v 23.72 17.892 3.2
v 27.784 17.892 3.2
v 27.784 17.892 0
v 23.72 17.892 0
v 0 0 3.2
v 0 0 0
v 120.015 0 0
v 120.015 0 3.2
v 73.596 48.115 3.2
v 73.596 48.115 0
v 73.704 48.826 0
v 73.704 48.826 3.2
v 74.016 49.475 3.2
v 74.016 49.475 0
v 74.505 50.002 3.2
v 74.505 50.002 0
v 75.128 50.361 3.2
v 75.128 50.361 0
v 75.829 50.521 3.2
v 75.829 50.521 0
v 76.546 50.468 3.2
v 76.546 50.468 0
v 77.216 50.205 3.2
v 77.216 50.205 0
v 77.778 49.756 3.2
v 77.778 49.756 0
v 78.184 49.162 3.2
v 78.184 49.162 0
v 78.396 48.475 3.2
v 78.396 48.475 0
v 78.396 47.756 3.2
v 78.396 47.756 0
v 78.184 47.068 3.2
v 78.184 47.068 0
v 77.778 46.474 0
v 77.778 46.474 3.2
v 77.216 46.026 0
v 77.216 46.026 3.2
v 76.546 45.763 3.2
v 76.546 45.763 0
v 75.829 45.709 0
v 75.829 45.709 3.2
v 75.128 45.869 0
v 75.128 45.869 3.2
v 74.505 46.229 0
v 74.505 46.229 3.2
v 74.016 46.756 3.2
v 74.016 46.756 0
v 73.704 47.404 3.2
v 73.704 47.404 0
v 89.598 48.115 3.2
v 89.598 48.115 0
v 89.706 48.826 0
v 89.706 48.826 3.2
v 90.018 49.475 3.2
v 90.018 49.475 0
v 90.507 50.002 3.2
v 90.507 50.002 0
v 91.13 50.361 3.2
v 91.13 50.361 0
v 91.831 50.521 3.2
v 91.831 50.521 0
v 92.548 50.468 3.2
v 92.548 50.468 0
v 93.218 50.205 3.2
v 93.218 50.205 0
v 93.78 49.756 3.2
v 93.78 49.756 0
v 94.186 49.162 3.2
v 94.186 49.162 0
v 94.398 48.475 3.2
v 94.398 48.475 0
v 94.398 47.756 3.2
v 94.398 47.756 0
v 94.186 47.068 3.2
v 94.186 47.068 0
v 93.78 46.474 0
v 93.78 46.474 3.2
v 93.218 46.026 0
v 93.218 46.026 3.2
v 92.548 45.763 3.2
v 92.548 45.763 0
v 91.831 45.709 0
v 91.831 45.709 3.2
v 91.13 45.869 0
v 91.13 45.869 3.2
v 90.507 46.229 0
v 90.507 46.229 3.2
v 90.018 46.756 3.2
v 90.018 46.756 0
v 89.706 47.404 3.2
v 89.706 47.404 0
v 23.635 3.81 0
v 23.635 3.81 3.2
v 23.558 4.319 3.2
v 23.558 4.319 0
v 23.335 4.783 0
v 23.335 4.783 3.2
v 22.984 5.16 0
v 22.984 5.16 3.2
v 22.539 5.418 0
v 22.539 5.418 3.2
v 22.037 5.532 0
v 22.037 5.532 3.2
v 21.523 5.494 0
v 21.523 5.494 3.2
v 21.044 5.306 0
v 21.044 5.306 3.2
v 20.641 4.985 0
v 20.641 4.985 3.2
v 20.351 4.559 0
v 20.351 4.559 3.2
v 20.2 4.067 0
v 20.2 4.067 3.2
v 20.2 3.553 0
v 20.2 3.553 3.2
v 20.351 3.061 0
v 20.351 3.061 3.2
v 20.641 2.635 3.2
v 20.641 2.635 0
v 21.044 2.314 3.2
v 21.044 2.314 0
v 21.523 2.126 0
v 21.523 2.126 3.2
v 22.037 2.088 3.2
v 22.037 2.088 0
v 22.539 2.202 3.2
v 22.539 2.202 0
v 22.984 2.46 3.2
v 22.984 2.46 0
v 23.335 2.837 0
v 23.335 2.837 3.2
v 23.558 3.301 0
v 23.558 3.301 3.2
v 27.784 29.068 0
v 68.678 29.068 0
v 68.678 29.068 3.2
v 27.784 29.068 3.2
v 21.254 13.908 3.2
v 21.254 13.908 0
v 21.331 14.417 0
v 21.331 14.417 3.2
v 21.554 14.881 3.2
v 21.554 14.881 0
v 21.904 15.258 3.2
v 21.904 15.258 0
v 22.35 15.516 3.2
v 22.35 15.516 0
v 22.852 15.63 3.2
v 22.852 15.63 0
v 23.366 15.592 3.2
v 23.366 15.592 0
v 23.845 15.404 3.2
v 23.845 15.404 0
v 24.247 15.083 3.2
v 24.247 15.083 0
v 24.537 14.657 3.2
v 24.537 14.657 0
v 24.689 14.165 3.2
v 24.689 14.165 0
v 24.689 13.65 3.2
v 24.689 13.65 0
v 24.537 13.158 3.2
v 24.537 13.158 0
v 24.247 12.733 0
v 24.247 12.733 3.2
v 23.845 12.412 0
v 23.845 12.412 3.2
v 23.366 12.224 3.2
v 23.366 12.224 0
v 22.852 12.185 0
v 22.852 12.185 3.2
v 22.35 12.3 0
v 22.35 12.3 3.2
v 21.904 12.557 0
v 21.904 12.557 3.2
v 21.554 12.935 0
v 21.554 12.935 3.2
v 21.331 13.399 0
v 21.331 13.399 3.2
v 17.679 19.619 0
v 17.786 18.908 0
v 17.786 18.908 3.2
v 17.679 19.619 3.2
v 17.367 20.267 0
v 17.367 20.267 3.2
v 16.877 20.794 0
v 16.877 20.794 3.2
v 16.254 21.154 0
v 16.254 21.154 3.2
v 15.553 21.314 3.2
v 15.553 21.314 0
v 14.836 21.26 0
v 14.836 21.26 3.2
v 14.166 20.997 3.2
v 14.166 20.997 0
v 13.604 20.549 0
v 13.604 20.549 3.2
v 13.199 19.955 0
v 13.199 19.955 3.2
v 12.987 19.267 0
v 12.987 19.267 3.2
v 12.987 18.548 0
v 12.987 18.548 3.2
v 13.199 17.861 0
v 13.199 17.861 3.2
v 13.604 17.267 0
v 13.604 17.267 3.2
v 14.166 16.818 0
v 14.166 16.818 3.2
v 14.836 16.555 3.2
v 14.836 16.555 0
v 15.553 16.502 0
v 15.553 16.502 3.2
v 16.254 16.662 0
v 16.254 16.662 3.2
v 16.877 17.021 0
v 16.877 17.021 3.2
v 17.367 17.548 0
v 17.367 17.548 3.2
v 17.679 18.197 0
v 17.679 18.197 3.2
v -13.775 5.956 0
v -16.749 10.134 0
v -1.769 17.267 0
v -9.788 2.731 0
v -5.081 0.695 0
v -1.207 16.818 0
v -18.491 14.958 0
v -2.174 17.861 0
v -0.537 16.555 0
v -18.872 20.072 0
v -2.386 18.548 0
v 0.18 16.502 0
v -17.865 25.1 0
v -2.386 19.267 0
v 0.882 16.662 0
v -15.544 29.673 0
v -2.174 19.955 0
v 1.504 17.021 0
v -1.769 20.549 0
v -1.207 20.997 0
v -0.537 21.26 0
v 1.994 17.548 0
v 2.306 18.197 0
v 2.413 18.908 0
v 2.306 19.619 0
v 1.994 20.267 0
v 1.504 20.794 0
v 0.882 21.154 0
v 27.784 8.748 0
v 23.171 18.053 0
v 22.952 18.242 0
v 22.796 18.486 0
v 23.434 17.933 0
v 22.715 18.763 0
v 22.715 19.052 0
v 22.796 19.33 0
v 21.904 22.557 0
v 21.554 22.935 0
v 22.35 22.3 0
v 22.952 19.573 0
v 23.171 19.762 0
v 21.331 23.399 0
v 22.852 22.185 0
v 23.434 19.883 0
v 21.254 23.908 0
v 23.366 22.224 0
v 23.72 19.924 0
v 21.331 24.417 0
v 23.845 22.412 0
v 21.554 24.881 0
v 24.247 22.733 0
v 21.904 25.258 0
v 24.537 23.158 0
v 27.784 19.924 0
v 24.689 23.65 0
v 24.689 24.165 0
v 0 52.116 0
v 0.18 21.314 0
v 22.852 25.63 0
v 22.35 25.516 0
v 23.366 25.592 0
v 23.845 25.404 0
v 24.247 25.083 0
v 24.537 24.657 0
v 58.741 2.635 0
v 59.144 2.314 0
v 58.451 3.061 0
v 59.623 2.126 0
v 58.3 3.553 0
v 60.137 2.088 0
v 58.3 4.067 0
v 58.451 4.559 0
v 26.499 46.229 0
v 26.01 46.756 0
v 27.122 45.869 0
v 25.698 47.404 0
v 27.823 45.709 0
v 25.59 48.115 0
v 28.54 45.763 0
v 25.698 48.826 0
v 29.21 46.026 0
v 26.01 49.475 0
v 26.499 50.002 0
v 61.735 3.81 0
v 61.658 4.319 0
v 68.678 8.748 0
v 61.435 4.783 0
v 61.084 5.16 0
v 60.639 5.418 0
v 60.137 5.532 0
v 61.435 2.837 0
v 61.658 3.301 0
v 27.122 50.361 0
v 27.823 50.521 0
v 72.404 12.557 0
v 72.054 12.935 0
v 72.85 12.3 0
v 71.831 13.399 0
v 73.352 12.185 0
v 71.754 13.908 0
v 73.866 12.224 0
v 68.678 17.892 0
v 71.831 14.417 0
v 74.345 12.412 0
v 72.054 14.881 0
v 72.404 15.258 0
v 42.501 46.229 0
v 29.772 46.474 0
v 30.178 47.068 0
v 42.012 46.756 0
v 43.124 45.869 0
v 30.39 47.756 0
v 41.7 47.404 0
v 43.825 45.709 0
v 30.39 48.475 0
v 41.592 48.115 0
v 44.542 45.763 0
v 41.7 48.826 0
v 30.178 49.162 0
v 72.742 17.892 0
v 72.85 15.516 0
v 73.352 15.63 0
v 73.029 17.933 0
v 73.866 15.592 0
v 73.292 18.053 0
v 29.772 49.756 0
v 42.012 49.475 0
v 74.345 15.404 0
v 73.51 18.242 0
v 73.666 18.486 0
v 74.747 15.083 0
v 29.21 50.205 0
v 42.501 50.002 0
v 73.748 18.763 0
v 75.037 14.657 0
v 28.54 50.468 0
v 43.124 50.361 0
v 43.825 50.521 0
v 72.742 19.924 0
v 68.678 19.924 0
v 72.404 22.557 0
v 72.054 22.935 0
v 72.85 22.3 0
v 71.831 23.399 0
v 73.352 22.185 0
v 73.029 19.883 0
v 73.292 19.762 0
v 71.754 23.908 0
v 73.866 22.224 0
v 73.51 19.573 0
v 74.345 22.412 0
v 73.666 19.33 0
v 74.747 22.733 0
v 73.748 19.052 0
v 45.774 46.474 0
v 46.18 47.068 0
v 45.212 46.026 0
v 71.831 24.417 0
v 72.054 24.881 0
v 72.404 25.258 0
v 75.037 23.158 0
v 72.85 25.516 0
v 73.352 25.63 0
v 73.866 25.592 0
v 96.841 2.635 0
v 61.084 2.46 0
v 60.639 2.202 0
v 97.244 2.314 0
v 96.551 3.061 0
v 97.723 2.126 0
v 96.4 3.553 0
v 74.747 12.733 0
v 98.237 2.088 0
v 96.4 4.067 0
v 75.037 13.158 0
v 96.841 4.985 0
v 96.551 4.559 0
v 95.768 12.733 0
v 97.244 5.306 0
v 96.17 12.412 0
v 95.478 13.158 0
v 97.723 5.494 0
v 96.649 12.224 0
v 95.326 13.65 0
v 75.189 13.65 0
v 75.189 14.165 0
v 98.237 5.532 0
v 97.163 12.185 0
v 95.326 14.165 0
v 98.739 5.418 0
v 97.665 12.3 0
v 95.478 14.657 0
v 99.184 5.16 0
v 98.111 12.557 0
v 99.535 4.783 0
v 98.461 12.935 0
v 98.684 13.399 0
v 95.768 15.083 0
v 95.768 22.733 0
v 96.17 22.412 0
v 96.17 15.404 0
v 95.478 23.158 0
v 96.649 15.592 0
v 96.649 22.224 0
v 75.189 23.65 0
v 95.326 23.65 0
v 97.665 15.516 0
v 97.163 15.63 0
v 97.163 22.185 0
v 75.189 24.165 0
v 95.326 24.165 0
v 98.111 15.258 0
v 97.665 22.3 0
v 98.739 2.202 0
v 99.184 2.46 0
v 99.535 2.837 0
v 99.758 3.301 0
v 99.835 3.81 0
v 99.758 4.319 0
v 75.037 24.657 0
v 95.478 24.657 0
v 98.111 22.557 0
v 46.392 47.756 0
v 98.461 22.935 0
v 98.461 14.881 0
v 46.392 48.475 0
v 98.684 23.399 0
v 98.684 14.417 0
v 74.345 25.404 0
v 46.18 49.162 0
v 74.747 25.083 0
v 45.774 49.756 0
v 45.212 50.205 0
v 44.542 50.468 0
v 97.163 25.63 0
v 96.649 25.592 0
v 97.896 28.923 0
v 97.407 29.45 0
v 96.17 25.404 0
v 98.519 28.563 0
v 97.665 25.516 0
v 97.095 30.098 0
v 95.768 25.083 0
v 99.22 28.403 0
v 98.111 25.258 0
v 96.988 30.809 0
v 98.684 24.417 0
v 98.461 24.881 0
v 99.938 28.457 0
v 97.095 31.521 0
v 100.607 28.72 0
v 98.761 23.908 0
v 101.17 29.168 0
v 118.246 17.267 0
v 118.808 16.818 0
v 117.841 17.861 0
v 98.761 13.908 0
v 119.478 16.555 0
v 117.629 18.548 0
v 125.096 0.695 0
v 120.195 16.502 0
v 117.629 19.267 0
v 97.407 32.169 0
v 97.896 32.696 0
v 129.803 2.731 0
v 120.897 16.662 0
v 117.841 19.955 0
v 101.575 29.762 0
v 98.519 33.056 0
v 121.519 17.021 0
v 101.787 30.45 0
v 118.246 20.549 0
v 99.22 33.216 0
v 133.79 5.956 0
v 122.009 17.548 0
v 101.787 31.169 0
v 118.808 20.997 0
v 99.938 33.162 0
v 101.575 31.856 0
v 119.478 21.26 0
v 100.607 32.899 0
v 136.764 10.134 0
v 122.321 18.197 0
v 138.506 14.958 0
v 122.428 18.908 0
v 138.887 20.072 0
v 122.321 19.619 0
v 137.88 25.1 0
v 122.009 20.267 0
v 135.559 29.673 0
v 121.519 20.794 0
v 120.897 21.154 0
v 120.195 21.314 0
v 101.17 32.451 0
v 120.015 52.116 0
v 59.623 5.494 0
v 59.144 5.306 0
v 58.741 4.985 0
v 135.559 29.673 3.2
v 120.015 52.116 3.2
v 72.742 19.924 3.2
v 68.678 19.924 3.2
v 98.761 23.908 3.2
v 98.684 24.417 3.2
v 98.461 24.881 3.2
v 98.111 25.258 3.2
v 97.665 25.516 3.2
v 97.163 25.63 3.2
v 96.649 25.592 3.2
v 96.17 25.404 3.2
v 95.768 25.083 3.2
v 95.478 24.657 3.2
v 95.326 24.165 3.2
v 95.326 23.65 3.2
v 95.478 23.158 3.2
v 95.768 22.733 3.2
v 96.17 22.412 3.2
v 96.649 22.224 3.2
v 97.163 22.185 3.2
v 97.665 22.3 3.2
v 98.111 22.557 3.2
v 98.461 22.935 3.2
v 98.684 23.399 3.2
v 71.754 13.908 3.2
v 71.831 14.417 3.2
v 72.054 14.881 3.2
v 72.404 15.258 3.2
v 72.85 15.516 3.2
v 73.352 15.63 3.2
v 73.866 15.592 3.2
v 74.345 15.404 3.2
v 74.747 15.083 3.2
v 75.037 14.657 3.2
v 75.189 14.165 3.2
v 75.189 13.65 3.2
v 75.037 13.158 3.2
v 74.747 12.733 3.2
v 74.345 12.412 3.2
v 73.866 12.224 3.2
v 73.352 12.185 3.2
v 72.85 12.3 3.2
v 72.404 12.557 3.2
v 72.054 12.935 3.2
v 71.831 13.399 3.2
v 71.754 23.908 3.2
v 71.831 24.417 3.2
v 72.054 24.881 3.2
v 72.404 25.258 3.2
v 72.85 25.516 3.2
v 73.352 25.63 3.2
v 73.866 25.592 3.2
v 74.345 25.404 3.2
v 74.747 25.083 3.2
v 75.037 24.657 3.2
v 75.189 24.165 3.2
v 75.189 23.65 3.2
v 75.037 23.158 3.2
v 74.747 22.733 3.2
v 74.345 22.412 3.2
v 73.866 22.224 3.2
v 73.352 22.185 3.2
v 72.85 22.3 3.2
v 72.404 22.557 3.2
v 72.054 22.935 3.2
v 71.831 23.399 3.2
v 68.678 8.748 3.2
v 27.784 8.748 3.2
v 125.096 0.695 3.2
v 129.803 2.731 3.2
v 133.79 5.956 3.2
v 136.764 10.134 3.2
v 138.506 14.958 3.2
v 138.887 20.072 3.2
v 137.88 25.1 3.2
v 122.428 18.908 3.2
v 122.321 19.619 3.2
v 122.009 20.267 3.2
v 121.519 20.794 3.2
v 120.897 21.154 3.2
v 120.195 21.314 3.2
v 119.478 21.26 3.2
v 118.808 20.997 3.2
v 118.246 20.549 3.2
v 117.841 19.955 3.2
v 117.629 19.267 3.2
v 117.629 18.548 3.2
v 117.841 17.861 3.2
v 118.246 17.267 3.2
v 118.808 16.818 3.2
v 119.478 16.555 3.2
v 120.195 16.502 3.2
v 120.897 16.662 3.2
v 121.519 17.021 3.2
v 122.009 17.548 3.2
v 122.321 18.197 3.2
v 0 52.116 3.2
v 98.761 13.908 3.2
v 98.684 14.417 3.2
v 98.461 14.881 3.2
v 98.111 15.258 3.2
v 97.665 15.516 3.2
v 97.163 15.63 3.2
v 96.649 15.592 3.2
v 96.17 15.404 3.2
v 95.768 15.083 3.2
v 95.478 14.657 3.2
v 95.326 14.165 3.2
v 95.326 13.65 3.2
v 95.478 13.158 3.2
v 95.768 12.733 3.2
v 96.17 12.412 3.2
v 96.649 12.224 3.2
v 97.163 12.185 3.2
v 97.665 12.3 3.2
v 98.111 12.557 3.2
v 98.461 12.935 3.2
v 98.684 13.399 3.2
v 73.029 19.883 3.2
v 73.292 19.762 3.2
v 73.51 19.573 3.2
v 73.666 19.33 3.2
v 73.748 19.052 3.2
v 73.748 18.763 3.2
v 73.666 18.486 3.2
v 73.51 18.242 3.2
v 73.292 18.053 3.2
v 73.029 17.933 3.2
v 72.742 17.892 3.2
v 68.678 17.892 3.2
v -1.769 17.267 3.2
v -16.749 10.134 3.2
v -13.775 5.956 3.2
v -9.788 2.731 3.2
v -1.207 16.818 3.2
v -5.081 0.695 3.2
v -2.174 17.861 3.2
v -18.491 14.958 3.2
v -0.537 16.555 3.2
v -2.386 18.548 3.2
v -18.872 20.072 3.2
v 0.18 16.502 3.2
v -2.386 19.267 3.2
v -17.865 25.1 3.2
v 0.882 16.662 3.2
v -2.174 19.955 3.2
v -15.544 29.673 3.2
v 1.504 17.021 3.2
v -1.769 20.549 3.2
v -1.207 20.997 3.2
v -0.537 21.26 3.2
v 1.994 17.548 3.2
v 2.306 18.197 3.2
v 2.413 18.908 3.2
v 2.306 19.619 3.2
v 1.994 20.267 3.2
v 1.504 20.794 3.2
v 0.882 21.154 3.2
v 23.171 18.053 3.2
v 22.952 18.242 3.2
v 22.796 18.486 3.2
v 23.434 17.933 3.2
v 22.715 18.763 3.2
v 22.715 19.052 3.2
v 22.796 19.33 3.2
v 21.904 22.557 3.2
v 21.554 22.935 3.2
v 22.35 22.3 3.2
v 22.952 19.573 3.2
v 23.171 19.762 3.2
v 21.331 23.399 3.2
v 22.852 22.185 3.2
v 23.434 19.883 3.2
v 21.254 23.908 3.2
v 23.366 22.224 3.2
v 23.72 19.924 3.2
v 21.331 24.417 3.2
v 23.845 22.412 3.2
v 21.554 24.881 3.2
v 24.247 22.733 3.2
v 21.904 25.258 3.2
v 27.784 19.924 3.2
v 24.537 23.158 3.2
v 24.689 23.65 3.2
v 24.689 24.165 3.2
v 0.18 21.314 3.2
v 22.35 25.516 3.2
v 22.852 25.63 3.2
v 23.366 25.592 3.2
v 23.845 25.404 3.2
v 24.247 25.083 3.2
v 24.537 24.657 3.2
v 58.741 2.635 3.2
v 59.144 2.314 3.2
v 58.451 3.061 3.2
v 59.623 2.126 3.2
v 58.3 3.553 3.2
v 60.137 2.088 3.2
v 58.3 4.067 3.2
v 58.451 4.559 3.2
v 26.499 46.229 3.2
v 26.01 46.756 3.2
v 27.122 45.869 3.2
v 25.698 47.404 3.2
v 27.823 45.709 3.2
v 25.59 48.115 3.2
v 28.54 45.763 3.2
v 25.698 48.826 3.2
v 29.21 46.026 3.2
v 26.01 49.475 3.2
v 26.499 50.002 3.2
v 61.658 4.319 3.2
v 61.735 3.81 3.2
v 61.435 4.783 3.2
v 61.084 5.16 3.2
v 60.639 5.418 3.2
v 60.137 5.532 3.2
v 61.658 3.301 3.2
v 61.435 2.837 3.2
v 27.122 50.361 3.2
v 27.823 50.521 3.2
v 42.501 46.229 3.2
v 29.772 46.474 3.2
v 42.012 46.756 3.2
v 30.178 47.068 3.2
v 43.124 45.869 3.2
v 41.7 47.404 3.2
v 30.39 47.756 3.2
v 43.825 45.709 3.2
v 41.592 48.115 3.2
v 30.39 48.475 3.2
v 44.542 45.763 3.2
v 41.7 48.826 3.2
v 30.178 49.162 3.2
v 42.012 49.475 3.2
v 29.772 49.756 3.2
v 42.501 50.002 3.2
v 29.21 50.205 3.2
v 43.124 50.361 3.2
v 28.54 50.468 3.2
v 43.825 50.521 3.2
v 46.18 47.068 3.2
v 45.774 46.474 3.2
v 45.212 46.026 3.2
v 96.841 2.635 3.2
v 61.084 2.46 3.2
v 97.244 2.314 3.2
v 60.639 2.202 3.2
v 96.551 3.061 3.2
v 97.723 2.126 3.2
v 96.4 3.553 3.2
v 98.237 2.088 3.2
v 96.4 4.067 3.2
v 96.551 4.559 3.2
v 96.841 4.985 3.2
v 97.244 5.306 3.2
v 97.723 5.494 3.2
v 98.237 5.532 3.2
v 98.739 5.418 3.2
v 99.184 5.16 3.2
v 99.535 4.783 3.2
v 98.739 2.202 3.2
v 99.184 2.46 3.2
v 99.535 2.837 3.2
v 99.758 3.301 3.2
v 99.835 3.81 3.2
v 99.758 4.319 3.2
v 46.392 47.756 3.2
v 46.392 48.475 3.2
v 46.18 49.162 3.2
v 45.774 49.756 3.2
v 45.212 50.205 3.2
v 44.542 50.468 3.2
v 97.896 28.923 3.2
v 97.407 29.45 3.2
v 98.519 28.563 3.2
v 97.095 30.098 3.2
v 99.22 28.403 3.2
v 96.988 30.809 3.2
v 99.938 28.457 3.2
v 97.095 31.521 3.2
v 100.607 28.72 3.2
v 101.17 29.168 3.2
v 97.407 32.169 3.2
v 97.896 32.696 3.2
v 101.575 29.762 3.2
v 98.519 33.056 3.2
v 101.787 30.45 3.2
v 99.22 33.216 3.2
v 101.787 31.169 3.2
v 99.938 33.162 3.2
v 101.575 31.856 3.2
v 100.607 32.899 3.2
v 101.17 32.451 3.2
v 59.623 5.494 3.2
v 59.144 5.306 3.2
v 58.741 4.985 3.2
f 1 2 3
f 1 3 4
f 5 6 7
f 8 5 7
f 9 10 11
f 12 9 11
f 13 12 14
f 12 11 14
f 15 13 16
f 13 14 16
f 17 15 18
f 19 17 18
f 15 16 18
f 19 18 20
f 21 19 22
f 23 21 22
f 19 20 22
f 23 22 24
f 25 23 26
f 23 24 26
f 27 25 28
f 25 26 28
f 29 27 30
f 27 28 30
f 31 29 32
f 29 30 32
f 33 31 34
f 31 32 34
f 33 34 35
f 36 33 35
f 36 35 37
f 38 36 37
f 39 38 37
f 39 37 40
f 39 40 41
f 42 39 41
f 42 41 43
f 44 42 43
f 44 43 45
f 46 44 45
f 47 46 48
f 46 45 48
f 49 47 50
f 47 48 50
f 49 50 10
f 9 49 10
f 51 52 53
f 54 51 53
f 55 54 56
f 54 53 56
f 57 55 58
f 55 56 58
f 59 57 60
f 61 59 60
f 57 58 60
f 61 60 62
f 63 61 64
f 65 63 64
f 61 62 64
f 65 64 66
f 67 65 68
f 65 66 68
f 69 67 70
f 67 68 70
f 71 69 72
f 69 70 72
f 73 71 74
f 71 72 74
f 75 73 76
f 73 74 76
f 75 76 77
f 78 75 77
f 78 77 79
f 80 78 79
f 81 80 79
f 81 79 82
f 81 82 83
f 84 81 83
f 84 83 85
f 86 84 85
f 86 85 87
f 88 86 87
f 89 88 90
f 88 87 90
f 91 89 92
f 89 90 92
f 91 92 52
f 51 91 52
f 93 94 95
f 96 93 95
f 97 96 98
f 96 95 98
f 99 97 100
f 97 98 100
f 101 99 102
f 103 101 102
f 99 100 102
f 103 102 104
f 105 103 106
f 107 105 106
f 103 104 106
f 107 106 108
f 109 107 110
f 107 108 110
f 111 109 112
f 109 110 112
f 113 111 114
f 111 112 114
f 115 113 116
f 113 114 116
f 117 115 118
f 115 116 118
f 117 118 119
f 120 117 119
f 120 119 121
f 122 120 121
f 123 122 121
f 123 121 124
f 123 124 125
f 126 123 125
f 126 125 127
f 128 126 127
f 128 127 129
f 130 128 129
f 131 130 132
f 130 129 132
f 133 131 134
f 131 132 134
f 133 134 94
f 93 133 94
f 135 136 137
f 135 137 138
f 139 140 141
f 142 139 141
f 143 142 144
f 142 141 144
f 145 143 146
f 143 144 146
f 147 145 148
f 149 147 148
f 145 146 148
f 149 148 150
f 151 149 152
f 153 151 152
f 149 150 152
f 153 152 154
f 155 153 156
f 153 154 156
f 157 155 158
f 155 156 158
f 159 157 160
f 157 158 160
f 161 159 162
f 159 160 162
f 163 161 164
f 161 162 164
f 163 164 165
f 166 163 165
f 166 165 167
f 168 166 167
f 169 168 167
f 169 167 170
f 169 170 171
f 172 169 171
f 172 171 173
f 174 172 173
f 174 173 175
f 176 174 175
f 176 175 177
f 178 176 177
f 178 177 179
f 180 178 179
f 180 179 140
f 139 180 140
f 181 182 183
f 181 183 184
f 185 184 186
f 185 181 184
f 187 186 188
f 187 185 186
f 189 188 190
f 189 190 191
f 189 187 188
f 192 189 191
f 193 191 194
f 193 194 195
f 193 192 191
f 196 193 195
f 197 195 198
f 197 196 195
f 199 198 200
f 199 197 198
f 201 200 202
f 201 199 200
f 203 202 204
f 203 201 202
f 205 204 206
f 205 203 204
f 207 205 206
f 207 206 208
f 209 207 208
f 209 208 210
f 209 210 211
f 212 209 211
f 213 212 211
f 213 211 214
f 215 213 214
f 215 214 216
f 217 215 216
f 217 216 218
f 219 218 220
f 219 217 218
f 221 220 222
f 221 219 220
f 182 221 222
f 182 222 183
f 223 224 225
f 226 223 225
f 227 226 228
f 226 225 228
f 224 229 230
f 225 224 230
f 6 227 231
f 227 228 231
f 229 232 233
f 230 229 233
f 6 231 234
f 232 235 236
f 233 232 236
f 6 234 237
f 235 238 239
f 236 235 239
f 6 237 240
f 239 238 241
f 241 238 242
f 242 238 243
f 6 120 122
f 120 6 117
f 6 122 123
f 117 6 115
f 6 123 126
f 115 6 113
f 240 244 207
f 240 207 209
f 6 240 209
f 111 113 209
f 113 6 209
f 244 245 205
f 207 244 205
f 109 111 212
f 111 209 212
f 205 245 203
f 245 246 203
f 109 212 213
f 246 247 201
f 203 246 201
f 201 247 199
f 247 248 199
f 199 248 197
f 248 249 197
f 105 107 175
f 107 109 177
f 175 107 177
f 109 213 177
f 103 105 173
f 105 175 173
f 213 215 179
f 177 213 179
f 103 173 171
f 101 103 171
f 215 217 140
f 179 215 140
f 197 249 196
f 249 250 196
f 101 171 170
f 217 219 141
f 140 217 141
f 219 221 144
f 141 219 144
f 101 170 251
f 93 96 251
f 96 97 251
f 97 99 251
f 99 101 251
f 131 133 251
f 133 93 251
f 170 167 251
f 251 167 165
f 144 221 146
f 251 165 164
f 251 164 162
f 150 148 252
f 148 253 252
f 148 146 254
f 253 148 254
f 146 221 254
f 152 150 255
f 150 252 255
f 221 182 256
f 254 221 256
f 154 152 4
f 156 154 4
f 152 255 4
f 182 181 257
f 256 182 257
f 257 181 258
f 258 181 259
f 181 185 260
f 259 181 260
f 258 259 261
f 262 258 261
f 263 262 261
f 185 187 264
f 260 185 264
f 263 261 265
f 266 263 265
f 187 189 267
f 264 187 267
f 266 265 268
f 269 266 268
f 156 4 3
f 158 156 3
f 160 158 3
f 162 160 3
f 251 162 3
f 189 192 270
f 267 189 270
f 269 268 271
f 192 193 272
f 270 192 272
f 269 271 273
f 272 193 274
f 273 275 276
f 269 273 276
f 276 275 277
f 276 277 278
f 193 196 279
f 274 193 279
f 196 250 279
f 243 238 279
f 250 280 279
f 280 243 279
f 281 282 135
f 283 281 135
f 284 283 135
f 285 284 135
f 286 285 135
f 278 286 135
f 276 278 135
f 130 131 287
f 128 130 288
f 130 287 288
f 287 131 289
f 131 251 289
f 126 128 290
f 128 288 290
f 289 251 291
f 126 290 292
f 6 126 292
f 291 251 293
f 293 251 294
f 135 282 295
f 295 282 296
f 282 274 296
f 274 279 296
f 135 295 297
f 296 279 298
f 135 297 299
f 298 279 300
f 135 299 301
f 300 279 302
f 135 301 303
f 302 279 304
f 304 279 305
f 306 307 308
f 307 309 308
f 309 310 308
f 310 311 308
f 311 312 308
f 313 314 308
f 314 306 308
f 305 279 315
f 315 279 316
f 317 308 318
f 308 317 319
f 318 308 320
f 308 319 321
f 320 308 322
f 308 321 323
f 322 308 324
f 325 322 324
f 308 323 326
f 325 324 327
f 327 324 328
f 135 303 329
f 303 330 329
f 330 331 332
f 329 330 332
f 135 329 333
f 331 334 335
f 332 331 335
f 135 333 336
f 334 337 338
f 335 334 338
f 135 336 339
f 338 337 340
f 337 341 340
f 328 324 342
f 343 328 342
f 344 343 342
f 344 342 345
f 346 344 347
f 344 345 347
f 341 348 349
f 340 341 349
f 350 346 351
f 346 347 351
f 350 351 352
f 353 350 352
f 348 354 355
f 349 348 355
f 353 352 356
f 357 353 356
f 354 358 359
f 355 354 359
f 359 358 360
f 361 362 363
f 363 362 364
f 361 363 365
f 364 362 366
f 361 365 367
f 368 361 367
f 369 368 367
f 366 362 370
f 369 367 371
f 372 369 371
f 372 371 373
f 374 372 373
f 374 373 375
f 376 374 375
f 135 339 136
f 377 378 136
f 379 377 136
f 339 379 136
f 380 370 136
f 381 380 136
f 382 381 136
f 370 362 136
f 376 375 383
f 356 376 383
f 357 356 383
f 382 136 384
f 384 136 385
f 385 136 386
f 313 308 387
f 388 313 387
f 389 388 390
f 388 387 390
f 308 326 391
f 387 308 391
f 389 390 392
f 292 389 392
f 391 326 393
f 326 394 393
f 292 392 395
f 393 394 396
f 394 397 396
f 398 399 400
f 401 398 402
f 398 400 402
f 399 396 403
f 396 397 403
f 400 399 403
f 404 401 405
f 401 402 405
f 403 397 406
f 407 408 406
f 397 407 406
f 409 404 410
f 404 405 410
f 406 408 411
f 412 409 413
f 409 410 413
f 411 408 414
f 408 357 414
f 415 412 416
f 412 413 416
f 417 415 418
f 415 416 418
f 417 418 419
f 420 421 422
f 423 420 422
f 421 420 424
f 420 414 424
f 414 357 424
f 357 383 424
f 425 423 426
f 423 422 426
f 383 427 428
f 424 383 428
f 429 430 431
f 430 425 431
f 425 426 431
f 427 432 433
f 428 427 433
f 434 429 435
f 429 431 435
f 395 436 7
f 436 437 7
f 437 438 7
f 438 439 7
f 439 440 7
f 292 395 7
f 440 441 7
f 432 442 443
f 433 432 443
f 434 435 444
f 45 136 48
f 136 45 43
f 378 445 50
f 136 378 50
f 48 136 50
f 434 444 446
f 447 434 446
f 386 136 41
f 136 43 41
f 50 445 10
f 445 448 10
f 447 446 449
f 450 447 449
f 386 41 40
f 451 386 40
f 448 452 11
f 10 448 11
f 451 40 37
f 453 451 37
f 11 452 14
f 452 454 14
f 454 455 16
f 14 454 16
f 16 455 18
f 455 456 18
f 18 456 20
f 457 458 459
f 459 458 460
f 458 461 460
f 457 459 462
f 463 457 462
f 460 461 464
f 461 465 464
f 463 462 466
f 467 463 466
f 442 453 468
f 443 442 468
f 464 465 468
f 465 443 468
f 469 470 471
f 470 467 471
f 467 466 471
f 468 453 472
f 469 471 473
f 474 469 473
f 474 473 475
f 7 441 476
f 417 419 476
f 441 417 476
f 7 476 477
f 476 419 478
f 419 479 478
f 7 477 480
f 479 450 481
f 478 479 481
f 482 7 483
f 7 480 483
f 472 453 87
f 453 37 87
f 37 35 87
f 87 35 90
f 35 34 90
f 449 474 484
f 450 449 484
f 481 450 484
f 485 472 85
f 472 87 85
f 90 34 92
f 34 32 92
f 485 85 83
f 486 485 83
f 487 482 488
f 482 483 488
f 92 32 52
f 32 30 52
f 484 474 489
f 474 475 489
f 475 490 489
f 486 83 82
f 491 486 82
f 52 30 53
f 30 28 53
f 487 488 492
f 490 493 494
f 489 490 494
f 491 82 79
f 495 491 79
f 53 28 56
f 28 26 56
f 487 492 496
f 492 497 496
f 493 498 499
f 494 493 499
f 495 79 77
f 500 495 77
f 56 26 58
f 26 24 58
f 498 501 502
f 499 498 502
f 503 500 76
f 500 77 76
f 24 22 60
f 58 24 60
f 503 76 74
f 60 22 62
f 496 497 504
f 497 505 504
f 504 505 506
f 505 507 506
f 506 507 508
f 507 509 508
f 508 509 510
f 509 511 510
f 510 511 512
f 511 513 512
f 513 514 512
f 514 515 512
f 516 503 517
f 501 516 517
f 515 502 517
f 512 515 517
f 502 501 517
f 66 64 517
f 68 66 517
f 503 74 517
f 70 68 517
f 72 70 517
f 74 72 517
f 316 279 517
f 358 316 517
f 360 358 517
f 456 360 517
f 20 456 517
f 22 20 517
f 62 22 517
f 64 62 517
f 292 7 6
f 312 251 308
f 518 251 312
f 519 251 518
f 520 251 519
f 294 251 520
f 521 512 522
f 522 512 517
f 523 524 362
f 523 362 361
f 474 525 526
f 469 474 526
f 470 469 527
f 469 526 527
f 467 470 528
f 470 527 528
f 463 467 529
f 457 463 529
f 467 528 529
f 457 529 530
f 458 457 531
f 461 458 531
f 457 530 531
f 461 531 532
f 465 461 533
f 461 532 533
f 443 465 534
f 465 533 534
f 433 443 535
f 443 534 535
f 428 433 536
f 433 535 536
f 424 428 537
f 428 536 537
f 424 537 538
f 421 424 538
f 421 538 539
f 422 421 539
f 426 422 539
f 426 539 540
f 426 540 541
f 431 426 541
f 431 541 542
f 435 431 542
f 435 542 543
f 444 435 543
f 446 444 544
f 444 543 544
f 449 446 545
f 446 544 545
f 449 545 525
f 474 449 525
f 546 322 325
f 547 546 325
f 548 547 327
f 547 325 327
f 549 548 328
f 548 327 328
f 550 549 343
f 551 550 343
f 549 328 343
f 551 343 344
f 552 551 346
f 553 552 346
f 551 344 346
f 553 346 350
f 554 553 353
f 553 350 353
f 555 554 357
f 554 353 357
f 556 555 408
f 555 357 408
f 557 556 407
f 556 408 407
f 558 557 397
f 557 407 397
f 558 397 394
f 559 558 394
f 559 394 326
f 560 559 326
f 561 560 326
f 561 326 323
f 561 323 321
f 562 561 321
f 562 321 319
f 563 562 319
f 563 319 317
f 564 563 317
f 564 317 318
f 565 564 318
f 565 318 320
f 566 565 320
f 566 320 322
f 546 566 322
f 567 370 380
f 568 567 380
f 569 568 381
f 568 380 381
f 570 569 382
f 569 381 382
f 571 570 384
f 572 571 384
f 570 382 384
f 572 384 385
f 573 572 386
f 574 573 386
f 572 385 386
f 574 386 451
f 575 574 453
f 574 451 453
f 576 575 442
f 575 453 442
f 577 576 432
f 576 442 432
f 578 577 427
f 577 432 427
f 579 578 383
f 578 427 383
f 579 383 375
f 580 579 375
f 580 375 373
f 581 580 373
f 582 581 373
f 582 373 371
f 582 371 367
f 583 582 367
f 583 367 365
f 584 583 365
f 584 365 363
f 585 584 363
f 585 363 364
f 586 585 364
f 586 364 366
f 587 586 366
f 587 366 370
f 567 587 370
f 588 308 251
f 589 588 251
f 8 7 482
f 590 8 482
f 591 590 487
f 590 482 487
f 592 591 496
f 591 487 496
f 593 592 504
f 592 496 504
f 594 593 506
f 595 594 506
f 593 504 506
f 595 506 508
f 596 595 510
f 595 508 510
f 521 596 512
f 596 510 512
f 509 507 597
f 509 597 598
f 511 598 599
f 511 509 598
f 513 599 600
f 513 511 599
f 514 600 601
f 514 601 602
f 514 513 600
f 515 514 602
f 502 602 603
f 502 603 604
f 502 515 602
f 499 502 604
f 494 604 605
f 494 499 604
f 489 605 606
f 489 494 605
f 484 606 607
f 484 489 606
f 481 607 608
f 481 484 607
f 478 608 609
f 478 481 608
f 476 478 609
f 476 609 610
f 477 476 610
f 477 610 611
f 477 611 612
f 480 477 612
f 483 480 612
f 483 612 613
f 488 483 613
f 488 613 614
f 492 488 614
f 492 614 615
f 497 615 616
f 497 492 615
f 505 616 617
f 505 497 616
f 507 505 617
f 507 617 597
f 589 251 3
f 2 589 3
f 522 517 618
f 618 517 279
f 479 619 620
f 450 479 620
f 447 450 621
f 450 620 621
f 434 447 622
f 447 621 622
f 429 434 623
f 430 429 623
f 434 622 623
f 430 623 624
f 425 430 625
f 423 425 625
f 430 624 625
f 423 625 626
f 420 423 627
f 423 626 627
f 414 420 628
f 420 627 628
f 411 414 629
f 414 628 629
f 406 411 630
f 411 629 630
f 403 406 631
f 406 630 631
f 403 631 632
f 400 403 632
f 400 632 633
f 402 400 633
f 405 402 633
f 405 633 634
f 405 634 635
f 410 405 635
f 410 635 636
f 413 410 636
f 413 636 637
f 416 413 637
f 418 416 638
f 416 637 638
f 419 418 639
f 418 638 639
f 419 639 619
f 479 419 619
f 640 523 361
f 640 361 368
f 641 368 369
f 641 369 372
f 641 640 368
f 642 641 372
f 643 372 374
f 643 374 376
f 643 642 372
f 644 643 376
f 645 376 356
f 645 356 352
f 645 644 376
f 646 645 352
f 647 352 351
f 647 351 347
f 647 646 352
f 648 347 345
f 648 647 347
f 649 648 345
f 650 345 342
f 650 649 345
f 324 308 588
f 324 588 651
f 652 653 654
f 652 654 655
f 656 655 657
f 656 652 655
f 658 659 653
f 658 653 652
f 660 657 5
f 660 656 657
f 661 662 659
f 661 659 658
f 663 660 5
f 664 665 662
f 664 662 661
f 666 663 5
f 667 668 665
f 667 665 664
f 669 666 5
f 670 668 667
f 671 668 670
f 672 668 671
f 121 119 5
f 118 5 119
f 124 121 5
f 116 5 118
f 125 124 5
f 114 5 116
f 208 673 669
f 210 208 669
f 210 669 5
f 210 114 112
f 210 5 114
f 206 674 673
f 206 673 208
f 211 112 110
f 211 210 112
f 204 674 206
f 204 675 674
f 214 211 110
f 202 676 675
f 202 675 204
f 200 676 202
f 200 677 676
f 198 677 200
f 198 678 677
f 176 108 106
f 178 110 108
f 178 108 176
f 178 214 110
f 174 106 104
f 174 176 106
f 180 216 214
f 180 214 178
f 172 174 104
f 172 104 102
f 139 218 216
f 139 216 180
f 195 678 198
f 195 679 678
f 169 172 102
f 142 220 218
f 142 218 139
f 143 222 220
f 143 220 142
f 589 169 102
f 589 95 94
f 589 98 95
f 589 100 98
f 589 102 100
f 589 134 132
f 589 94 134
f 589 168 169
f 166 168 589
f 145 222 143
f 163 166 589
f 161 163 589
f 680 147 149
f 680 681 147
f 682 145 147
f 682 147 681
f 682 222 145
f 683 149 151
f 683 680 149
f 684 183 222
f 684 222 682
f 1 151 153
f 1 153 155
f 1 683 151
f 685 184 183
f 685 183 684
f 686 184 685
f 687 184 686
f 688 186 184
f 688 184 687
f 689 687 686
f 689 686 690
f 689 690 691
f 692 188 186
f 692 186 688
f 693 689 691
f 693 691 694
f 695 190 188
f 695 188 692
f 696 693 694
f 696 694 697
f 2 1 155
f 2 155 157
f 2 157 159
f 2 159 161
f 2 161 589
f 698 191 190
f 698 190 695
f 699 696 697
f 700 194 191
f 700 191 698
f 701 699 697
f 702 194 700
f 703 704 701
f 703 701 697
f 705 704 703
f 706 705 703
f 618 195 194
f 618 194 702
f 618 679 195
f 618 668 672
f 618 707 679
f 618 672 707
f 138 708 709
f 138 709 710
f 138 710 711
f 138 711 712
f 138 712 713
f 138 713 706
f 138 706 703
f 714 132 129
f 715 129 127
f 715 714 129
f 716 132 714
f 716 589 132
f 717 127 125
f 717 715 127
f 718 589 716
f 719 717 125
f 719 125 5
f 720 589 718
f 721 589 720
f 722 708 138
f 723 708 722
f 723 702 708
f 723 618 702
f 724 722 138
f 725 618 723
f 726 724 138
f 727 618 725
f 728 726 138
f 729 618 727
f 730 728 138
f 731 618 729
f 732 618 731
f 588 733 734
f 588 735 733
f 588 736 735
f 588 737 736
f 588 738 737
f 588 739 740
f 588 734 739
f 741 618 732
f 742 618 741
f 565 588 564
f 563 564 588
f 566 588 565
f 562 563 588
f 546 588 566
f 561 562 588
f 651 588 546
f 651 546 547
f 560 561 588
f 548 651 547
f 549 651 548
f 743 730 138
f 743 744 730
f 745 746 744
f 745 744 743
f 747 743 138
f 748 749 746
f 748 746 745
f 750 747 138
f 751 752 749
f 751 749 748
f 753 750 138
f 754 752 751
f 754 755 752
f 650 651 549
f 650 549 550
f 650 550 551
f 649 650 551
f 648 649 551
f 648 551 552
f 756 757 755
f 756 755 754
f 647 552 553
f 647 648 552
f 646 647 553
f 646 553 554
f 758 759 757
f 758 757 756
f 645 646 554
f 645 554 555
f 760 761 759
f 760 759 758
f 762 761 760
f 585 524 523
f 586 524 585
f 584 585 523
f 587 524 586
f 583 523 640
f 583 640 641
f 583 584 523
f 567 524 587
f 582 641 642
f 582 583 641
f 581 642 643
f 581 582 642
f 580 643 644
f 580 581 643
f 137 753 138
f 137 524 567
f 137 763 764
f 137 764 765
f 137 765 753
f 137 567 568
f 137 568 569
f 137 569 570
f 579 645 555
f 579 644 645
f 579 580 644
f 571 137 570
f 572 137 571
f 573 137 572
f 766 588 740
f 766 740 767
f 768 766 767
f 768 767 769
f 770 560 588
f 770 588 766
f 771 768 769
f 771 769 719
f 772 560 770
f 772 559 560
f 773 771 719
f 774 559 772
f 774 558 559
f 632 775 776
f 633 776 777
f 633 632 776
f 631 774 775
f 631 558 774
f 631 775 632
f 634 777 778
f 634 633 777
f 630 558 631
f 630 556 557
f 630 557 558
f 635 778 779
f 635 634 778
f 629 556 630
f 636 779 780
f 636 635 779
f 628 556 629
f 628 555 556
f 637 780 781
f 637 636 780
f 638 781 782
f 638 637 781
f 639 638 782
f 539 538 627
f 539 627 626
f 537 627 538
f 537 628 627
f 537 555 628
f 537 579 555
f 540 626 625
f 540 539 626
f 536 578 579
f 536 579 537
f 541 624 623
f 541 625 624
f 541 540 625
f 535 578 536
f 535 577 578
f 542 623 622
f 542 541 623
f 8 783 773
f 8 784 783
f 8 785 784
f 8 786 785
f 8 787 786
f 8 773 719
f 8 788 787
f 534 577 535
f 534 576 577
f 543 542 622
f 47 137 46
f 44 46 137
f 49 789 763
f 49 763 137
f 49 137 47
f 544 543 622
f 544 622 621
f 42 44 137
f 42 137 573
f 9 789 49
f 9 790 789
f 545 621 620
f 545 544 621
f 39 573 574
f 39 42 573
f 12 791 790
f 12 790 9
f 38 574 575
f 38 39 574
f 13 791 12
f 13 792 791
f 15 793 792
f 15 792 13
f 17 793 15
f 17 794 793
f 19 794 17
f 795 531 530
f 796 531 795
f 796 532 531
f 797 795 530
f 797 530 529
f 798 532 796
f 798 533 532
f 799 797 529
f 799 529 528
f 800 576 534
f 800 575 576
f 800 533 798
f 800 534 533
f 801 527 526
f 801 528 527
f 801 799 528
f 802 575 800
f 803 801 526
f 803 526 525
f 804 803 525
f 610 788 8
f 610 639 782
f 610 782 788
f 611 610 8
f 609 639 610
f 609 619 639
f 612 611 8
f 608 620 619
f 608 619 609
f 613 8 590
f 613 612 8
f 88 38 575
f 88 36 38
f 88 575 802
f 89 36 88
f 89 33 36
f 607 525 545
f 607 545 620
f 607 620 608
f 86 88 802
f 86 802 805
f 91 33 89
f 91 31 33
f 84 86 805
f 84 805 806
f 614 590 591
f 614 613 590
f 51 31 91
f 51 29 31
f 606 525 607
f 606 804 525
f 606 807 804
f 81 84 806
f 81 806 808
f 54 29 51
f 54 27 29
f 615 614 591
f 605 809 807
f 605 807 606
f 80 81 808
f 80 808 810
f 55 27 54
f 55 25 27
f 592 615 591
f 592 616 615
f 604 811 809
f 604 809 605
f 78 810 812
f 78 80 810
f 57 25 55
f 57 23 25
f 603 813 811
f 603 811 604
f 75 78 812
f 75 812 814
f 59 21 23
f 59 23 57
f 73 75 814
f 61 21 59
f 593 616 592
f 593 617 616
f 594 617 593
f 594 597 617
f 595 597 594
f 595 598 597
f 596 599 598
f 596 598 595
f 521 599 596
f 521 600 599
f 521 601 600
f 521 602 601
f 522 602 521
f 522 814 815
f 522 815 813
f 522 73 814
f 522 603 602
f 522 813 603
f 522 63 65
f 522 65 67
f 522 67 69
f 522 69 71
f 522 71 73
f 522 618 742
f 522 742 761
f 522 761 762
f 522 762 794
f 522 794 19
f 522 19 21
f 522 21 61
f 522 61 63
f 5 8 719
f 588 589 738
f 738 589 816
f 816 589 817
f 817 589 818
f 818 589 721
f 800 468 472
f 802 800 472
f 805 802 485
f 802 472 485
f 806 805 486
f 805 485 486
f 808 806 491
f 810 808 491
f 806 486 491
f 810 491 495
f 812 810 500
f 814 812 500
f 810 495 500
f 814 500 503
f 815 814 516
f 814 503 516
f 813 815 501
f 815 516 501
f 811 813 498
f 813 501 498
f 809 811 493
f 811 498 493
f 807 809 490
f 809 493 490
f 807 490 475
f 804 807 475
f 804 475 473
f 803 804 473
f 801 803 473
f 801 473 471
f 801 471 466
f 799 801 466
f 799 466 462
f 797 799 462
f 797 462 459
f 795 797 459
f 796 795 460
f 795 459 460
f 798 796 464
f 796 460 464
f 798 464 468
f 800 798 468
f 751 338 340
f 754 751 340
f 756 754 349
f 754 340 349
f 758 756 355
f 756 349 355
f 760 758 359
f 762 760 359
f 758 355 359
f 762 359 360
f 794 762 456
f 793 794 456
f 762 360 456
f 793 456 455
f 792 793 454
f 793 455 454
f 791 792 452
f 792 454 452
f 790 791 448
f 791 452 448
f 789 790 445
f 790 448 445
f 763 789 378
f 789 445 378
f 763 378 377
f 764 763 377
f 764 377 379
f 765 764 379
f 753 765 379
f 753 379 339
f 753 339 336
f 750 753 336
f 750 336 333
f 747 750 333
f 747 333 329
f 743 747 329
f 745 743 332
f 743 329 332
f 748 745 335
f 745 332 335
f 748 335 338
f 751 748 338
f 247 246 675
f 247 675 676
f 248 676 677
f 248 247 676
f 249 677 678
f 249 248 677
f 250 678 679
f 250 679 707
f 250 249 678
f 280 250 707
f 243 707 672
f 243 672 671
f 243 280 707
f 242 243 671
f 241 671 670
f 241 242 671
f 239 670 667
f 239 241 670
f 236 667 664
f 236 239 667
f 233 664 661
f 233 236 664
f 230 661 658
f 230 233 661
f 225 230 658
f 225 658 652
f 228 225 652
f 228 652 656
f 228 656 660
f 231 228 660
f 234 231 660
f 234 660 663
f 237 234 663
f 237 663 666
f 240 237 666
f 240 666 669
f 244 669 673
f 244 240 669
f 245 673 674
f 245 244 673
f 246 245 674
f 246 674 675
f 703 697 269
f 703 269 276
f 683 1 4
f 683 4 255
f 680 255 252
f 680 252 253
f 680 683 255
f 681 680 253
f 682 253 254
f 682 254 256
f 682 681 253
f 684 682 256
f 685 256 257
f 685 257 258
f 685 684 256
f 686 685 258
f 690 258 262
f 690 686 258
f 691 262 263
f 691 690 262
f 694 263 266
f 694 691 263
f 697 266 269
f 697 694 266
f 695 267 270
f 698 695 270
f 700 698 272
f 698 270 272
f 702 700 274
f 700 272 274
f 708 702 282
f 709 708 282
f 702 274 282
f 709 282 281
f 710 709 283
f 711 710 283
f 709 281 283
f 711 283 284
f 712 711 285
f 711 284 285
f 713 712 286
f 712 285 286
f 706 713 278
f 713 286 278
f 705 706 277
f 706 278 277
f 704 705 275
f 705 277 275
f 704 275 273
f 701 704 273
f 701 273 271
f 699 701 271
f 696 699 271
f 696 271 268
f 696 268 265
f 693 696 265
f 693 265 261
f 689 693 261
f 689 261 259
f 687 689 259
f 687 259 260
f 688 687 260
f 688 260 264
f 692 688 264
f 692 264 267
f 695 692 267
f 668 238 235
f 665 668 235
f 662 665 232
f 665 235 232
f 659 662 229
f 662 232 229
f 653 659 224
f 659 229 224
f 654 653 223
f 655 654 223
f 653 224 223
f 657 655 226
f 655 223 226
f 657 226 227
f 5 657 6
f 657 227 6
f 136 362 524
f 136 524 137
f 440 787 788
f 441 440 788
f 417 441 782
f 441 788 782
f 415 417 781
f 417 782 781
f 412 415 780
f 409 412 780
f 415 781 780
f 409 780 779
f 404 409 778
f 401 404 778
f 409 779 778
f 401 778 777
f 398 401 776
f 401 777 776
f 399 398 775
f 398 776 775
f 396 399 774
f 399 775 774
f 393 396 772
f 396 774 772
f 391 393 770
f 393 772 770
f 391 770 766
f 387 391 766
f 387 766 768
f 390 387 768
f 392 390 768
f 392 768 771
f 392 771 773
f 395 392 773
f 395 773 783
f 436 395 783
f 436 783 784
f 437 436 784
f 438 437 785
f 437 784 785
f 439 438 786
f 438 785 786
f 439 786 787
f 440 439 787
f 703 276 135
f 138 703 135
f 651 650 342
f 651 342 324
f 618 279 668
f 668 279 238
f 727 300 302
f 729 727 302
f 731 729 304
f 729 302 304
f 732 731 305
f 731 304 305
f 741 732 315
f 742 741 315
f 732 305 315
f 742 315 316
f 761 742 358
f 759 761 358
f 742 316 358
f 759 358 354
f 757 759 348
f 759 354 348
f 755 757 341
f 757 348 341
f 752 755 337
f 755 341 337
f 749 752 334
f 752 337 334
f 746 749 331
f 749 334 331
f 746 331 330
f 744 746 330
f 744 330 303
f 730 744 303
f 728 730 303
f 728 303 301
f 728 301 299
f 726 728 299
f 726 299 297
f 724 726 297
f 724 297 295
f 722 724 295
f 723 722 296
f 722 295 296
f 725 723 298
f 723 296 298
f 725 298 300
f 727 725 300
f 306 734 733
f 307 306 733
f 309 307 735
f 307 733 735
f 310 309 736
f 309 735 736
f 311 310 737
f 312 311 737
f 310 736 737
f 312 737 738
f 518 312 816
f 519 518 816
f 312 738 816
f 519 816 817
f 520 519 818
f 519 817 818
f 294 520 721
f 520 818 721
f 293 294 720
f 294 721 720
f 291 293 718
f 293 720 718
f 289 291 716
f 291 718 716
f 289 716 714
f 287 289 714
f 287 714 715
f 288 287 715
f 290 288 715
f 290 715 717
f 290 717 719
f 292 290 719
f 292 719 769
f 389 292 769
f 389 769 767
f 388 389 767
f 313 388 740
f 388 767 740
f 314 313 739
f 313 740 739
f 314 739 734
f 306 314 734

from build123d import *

# Parameters (mm, degrees)
SKETCH1_R           = 2.413
BOSS_EXTRUDE1_DEPTH = 3.2004
SKETCH2_R           = 2.413
CUT_EXTRUDE1_DEPTH  = 3.2004
SKETCH5_R           = 1.7272
SKETCH5_W           = 40.894
SKETCH5_H           = 20.32
CUT_EXTRUDE3_DEPTH  = 149.410997158
SKETCH6_R           = 1.7272
CUT_EXTRUDE4_DEPTH  = 3.2004
SKETCH7_R           = 2.413
CUT_EXTRUDE5_DEPTH  = 3.2004
SKETCH8_R           = 1.7272
CUT_EXTRUDE6_DEPTH  = 3.2004


with BuildPart() as part:
    # Sketch1 → Boss-Extrude1 (new body)
    with BuildSketch(Plane.XY):
        with BuildLine():
            Line((120.015, 52.11572), (0, 52.11572))
            Line((0, 52.11572), (-15.54366081, 29.673353196))
            ThreePointArc((-15.54366081, 29.673353196), (-16.74897968, 10.134216365), (0, 0))
            Line((0, 0), (120.015, 0))
            ThreePointArc((120.015, 0), (136.76397968, 10.134216365), (135.55866081, 29.673353196))
            Line((135.55866081, 29.673353196), (120.015, 52.11572))
        make_face()
        with Locations((120.015, 18.90776)):
            Circle(SKETCH1_R, mode=Mode.SUBTRACT)
        with Locations((0, 18.90776)):
            Circle(SKETCH1_R, mode=Mode.SUBTRACT)
        with Locations((15.37290121, 18.90776)):
            Circle(SKETCH1_R, mode=Mode.SUBTRACT)
    extrude(amount=BOSS_EXTRUDE1_DEPTH)

    # Sketch2 → Cut-Extrude1 (cut)
    with BuildSketch(Plane(origin=(0, 0, 0), x_dir=(-1, 0, 0), z_dir=(0, 0, -1))):
        with Locations((-92.0115, 48.11522)):
            Circle(SKETCH2_R)
        with Locations((-76.0095, 48.11522)):
            Circle(SKETCH2_R)
        with Locations((-44.0055, 48.11522)):
            Circle(SKETCH2_R)
        with Locations((-28.0035, 48.11522)):
            Circle(SKETCH2_R)
    extrude(amount=-CUT_EXTRUDE1_DEPTH, mode=Mode.SUBTRACT)

    # Sketch5 → Cut-Extrude3 (cut, through all)
    with BuildSketch(Plane(origin=(0, 0, 0), x_dir=(-1, 0, 0), z_dir=(0, 0, -1))):
        with Locations((-73.48130308, 23.90776)):
            Circle(SKETCH5_R)
        with Locations((-22.98130308, 13.90776)):
            Circle(SKETCH5_R)
        with Locations((-22.98130308, 23.90776)):
            Circle(SKETCH5_R)
        with Locations((-73.48130308, 13.90776)):
            Circle(SKETCH5_R)
        with Locations((-48.23130308, 18.90776)):
            Rectangle(SKETCH5_W, SKETCH5_H)
    extrude(amount=-CUT_EXTRUDE3_DEPTH, mode=Mode.SUBTRACT)

    # Sketch6 → Cut-Extrude4 (cut)
    with BuildSketch(Plane.XY.offset(3.2004)):
        with Locations((97.03369692, 23.90776)):
            Circle(SKETCH6_R)
        with Locations((97.03369692, 13.90776)):
            Circle(SKETCH6_R)
        with BuildLine():
            Line((23.72030308, 19.92376), (27.78430308, 19.92376))
            Line((27.78430308, 19.92376), (27.78430308, 17.89176))
            Line((27.78430308, 17.89176), (23.72030308, 17.89176))
            ThreePointArc((23.72030308, 17.89176), (22.70430308, 18.90776), (23.72030308, 19.92376))
        make_face()
        with BuildLine():
            Line((68.67830308, 19.92376), (72.74230308, 19.92376))
            ThreePointArc((72.74230308, 19.92376), (73.75830308, 18.90776), (72.74230308, 17.89176))
            Line((72.74230308, 17.89176), (68.67830308, 17.89176))
            Line((68.67830308, 17.89176), (68.67830308, 19.92376))
        make_face()
    extrude(amount=-CUT_EXTRUDE4_DEPTH, mode=Mode.SUBTRACT)

    # Sketch7 → Cut-Extrude5 (cut)
    with BuildSketch(Plane(origin=(0, 0, 0), x_dir=(-1, 0, 0), z_dir=(0, 0, -1))):
        with Locations((-99.400822531, 30.809360911)):
            Circle(SKETCH7_R)
    extrude(amount=-CUT_EXTRUDE5_DEPTH, mode=Mode.SUBTRACT)

    # Sketch8 → Cut-Extrude6 (cut)
    with BuildSketch(Plane.XY.offset(3.2004)):
        with Locations((21.9075, 3.81)):
            Circle(SKETCH8_R)
        with Locations((60.0075, 3.81)):
            Circle(SKETCH8_R)
        with Locations((98.1075, 3.81)):
            Circle(SKETCH8_R)
    extrude(amount=-CUT_EXTRUDE6_DEPTH, mode=Mode.SUBTRACT)


solid = part.part
